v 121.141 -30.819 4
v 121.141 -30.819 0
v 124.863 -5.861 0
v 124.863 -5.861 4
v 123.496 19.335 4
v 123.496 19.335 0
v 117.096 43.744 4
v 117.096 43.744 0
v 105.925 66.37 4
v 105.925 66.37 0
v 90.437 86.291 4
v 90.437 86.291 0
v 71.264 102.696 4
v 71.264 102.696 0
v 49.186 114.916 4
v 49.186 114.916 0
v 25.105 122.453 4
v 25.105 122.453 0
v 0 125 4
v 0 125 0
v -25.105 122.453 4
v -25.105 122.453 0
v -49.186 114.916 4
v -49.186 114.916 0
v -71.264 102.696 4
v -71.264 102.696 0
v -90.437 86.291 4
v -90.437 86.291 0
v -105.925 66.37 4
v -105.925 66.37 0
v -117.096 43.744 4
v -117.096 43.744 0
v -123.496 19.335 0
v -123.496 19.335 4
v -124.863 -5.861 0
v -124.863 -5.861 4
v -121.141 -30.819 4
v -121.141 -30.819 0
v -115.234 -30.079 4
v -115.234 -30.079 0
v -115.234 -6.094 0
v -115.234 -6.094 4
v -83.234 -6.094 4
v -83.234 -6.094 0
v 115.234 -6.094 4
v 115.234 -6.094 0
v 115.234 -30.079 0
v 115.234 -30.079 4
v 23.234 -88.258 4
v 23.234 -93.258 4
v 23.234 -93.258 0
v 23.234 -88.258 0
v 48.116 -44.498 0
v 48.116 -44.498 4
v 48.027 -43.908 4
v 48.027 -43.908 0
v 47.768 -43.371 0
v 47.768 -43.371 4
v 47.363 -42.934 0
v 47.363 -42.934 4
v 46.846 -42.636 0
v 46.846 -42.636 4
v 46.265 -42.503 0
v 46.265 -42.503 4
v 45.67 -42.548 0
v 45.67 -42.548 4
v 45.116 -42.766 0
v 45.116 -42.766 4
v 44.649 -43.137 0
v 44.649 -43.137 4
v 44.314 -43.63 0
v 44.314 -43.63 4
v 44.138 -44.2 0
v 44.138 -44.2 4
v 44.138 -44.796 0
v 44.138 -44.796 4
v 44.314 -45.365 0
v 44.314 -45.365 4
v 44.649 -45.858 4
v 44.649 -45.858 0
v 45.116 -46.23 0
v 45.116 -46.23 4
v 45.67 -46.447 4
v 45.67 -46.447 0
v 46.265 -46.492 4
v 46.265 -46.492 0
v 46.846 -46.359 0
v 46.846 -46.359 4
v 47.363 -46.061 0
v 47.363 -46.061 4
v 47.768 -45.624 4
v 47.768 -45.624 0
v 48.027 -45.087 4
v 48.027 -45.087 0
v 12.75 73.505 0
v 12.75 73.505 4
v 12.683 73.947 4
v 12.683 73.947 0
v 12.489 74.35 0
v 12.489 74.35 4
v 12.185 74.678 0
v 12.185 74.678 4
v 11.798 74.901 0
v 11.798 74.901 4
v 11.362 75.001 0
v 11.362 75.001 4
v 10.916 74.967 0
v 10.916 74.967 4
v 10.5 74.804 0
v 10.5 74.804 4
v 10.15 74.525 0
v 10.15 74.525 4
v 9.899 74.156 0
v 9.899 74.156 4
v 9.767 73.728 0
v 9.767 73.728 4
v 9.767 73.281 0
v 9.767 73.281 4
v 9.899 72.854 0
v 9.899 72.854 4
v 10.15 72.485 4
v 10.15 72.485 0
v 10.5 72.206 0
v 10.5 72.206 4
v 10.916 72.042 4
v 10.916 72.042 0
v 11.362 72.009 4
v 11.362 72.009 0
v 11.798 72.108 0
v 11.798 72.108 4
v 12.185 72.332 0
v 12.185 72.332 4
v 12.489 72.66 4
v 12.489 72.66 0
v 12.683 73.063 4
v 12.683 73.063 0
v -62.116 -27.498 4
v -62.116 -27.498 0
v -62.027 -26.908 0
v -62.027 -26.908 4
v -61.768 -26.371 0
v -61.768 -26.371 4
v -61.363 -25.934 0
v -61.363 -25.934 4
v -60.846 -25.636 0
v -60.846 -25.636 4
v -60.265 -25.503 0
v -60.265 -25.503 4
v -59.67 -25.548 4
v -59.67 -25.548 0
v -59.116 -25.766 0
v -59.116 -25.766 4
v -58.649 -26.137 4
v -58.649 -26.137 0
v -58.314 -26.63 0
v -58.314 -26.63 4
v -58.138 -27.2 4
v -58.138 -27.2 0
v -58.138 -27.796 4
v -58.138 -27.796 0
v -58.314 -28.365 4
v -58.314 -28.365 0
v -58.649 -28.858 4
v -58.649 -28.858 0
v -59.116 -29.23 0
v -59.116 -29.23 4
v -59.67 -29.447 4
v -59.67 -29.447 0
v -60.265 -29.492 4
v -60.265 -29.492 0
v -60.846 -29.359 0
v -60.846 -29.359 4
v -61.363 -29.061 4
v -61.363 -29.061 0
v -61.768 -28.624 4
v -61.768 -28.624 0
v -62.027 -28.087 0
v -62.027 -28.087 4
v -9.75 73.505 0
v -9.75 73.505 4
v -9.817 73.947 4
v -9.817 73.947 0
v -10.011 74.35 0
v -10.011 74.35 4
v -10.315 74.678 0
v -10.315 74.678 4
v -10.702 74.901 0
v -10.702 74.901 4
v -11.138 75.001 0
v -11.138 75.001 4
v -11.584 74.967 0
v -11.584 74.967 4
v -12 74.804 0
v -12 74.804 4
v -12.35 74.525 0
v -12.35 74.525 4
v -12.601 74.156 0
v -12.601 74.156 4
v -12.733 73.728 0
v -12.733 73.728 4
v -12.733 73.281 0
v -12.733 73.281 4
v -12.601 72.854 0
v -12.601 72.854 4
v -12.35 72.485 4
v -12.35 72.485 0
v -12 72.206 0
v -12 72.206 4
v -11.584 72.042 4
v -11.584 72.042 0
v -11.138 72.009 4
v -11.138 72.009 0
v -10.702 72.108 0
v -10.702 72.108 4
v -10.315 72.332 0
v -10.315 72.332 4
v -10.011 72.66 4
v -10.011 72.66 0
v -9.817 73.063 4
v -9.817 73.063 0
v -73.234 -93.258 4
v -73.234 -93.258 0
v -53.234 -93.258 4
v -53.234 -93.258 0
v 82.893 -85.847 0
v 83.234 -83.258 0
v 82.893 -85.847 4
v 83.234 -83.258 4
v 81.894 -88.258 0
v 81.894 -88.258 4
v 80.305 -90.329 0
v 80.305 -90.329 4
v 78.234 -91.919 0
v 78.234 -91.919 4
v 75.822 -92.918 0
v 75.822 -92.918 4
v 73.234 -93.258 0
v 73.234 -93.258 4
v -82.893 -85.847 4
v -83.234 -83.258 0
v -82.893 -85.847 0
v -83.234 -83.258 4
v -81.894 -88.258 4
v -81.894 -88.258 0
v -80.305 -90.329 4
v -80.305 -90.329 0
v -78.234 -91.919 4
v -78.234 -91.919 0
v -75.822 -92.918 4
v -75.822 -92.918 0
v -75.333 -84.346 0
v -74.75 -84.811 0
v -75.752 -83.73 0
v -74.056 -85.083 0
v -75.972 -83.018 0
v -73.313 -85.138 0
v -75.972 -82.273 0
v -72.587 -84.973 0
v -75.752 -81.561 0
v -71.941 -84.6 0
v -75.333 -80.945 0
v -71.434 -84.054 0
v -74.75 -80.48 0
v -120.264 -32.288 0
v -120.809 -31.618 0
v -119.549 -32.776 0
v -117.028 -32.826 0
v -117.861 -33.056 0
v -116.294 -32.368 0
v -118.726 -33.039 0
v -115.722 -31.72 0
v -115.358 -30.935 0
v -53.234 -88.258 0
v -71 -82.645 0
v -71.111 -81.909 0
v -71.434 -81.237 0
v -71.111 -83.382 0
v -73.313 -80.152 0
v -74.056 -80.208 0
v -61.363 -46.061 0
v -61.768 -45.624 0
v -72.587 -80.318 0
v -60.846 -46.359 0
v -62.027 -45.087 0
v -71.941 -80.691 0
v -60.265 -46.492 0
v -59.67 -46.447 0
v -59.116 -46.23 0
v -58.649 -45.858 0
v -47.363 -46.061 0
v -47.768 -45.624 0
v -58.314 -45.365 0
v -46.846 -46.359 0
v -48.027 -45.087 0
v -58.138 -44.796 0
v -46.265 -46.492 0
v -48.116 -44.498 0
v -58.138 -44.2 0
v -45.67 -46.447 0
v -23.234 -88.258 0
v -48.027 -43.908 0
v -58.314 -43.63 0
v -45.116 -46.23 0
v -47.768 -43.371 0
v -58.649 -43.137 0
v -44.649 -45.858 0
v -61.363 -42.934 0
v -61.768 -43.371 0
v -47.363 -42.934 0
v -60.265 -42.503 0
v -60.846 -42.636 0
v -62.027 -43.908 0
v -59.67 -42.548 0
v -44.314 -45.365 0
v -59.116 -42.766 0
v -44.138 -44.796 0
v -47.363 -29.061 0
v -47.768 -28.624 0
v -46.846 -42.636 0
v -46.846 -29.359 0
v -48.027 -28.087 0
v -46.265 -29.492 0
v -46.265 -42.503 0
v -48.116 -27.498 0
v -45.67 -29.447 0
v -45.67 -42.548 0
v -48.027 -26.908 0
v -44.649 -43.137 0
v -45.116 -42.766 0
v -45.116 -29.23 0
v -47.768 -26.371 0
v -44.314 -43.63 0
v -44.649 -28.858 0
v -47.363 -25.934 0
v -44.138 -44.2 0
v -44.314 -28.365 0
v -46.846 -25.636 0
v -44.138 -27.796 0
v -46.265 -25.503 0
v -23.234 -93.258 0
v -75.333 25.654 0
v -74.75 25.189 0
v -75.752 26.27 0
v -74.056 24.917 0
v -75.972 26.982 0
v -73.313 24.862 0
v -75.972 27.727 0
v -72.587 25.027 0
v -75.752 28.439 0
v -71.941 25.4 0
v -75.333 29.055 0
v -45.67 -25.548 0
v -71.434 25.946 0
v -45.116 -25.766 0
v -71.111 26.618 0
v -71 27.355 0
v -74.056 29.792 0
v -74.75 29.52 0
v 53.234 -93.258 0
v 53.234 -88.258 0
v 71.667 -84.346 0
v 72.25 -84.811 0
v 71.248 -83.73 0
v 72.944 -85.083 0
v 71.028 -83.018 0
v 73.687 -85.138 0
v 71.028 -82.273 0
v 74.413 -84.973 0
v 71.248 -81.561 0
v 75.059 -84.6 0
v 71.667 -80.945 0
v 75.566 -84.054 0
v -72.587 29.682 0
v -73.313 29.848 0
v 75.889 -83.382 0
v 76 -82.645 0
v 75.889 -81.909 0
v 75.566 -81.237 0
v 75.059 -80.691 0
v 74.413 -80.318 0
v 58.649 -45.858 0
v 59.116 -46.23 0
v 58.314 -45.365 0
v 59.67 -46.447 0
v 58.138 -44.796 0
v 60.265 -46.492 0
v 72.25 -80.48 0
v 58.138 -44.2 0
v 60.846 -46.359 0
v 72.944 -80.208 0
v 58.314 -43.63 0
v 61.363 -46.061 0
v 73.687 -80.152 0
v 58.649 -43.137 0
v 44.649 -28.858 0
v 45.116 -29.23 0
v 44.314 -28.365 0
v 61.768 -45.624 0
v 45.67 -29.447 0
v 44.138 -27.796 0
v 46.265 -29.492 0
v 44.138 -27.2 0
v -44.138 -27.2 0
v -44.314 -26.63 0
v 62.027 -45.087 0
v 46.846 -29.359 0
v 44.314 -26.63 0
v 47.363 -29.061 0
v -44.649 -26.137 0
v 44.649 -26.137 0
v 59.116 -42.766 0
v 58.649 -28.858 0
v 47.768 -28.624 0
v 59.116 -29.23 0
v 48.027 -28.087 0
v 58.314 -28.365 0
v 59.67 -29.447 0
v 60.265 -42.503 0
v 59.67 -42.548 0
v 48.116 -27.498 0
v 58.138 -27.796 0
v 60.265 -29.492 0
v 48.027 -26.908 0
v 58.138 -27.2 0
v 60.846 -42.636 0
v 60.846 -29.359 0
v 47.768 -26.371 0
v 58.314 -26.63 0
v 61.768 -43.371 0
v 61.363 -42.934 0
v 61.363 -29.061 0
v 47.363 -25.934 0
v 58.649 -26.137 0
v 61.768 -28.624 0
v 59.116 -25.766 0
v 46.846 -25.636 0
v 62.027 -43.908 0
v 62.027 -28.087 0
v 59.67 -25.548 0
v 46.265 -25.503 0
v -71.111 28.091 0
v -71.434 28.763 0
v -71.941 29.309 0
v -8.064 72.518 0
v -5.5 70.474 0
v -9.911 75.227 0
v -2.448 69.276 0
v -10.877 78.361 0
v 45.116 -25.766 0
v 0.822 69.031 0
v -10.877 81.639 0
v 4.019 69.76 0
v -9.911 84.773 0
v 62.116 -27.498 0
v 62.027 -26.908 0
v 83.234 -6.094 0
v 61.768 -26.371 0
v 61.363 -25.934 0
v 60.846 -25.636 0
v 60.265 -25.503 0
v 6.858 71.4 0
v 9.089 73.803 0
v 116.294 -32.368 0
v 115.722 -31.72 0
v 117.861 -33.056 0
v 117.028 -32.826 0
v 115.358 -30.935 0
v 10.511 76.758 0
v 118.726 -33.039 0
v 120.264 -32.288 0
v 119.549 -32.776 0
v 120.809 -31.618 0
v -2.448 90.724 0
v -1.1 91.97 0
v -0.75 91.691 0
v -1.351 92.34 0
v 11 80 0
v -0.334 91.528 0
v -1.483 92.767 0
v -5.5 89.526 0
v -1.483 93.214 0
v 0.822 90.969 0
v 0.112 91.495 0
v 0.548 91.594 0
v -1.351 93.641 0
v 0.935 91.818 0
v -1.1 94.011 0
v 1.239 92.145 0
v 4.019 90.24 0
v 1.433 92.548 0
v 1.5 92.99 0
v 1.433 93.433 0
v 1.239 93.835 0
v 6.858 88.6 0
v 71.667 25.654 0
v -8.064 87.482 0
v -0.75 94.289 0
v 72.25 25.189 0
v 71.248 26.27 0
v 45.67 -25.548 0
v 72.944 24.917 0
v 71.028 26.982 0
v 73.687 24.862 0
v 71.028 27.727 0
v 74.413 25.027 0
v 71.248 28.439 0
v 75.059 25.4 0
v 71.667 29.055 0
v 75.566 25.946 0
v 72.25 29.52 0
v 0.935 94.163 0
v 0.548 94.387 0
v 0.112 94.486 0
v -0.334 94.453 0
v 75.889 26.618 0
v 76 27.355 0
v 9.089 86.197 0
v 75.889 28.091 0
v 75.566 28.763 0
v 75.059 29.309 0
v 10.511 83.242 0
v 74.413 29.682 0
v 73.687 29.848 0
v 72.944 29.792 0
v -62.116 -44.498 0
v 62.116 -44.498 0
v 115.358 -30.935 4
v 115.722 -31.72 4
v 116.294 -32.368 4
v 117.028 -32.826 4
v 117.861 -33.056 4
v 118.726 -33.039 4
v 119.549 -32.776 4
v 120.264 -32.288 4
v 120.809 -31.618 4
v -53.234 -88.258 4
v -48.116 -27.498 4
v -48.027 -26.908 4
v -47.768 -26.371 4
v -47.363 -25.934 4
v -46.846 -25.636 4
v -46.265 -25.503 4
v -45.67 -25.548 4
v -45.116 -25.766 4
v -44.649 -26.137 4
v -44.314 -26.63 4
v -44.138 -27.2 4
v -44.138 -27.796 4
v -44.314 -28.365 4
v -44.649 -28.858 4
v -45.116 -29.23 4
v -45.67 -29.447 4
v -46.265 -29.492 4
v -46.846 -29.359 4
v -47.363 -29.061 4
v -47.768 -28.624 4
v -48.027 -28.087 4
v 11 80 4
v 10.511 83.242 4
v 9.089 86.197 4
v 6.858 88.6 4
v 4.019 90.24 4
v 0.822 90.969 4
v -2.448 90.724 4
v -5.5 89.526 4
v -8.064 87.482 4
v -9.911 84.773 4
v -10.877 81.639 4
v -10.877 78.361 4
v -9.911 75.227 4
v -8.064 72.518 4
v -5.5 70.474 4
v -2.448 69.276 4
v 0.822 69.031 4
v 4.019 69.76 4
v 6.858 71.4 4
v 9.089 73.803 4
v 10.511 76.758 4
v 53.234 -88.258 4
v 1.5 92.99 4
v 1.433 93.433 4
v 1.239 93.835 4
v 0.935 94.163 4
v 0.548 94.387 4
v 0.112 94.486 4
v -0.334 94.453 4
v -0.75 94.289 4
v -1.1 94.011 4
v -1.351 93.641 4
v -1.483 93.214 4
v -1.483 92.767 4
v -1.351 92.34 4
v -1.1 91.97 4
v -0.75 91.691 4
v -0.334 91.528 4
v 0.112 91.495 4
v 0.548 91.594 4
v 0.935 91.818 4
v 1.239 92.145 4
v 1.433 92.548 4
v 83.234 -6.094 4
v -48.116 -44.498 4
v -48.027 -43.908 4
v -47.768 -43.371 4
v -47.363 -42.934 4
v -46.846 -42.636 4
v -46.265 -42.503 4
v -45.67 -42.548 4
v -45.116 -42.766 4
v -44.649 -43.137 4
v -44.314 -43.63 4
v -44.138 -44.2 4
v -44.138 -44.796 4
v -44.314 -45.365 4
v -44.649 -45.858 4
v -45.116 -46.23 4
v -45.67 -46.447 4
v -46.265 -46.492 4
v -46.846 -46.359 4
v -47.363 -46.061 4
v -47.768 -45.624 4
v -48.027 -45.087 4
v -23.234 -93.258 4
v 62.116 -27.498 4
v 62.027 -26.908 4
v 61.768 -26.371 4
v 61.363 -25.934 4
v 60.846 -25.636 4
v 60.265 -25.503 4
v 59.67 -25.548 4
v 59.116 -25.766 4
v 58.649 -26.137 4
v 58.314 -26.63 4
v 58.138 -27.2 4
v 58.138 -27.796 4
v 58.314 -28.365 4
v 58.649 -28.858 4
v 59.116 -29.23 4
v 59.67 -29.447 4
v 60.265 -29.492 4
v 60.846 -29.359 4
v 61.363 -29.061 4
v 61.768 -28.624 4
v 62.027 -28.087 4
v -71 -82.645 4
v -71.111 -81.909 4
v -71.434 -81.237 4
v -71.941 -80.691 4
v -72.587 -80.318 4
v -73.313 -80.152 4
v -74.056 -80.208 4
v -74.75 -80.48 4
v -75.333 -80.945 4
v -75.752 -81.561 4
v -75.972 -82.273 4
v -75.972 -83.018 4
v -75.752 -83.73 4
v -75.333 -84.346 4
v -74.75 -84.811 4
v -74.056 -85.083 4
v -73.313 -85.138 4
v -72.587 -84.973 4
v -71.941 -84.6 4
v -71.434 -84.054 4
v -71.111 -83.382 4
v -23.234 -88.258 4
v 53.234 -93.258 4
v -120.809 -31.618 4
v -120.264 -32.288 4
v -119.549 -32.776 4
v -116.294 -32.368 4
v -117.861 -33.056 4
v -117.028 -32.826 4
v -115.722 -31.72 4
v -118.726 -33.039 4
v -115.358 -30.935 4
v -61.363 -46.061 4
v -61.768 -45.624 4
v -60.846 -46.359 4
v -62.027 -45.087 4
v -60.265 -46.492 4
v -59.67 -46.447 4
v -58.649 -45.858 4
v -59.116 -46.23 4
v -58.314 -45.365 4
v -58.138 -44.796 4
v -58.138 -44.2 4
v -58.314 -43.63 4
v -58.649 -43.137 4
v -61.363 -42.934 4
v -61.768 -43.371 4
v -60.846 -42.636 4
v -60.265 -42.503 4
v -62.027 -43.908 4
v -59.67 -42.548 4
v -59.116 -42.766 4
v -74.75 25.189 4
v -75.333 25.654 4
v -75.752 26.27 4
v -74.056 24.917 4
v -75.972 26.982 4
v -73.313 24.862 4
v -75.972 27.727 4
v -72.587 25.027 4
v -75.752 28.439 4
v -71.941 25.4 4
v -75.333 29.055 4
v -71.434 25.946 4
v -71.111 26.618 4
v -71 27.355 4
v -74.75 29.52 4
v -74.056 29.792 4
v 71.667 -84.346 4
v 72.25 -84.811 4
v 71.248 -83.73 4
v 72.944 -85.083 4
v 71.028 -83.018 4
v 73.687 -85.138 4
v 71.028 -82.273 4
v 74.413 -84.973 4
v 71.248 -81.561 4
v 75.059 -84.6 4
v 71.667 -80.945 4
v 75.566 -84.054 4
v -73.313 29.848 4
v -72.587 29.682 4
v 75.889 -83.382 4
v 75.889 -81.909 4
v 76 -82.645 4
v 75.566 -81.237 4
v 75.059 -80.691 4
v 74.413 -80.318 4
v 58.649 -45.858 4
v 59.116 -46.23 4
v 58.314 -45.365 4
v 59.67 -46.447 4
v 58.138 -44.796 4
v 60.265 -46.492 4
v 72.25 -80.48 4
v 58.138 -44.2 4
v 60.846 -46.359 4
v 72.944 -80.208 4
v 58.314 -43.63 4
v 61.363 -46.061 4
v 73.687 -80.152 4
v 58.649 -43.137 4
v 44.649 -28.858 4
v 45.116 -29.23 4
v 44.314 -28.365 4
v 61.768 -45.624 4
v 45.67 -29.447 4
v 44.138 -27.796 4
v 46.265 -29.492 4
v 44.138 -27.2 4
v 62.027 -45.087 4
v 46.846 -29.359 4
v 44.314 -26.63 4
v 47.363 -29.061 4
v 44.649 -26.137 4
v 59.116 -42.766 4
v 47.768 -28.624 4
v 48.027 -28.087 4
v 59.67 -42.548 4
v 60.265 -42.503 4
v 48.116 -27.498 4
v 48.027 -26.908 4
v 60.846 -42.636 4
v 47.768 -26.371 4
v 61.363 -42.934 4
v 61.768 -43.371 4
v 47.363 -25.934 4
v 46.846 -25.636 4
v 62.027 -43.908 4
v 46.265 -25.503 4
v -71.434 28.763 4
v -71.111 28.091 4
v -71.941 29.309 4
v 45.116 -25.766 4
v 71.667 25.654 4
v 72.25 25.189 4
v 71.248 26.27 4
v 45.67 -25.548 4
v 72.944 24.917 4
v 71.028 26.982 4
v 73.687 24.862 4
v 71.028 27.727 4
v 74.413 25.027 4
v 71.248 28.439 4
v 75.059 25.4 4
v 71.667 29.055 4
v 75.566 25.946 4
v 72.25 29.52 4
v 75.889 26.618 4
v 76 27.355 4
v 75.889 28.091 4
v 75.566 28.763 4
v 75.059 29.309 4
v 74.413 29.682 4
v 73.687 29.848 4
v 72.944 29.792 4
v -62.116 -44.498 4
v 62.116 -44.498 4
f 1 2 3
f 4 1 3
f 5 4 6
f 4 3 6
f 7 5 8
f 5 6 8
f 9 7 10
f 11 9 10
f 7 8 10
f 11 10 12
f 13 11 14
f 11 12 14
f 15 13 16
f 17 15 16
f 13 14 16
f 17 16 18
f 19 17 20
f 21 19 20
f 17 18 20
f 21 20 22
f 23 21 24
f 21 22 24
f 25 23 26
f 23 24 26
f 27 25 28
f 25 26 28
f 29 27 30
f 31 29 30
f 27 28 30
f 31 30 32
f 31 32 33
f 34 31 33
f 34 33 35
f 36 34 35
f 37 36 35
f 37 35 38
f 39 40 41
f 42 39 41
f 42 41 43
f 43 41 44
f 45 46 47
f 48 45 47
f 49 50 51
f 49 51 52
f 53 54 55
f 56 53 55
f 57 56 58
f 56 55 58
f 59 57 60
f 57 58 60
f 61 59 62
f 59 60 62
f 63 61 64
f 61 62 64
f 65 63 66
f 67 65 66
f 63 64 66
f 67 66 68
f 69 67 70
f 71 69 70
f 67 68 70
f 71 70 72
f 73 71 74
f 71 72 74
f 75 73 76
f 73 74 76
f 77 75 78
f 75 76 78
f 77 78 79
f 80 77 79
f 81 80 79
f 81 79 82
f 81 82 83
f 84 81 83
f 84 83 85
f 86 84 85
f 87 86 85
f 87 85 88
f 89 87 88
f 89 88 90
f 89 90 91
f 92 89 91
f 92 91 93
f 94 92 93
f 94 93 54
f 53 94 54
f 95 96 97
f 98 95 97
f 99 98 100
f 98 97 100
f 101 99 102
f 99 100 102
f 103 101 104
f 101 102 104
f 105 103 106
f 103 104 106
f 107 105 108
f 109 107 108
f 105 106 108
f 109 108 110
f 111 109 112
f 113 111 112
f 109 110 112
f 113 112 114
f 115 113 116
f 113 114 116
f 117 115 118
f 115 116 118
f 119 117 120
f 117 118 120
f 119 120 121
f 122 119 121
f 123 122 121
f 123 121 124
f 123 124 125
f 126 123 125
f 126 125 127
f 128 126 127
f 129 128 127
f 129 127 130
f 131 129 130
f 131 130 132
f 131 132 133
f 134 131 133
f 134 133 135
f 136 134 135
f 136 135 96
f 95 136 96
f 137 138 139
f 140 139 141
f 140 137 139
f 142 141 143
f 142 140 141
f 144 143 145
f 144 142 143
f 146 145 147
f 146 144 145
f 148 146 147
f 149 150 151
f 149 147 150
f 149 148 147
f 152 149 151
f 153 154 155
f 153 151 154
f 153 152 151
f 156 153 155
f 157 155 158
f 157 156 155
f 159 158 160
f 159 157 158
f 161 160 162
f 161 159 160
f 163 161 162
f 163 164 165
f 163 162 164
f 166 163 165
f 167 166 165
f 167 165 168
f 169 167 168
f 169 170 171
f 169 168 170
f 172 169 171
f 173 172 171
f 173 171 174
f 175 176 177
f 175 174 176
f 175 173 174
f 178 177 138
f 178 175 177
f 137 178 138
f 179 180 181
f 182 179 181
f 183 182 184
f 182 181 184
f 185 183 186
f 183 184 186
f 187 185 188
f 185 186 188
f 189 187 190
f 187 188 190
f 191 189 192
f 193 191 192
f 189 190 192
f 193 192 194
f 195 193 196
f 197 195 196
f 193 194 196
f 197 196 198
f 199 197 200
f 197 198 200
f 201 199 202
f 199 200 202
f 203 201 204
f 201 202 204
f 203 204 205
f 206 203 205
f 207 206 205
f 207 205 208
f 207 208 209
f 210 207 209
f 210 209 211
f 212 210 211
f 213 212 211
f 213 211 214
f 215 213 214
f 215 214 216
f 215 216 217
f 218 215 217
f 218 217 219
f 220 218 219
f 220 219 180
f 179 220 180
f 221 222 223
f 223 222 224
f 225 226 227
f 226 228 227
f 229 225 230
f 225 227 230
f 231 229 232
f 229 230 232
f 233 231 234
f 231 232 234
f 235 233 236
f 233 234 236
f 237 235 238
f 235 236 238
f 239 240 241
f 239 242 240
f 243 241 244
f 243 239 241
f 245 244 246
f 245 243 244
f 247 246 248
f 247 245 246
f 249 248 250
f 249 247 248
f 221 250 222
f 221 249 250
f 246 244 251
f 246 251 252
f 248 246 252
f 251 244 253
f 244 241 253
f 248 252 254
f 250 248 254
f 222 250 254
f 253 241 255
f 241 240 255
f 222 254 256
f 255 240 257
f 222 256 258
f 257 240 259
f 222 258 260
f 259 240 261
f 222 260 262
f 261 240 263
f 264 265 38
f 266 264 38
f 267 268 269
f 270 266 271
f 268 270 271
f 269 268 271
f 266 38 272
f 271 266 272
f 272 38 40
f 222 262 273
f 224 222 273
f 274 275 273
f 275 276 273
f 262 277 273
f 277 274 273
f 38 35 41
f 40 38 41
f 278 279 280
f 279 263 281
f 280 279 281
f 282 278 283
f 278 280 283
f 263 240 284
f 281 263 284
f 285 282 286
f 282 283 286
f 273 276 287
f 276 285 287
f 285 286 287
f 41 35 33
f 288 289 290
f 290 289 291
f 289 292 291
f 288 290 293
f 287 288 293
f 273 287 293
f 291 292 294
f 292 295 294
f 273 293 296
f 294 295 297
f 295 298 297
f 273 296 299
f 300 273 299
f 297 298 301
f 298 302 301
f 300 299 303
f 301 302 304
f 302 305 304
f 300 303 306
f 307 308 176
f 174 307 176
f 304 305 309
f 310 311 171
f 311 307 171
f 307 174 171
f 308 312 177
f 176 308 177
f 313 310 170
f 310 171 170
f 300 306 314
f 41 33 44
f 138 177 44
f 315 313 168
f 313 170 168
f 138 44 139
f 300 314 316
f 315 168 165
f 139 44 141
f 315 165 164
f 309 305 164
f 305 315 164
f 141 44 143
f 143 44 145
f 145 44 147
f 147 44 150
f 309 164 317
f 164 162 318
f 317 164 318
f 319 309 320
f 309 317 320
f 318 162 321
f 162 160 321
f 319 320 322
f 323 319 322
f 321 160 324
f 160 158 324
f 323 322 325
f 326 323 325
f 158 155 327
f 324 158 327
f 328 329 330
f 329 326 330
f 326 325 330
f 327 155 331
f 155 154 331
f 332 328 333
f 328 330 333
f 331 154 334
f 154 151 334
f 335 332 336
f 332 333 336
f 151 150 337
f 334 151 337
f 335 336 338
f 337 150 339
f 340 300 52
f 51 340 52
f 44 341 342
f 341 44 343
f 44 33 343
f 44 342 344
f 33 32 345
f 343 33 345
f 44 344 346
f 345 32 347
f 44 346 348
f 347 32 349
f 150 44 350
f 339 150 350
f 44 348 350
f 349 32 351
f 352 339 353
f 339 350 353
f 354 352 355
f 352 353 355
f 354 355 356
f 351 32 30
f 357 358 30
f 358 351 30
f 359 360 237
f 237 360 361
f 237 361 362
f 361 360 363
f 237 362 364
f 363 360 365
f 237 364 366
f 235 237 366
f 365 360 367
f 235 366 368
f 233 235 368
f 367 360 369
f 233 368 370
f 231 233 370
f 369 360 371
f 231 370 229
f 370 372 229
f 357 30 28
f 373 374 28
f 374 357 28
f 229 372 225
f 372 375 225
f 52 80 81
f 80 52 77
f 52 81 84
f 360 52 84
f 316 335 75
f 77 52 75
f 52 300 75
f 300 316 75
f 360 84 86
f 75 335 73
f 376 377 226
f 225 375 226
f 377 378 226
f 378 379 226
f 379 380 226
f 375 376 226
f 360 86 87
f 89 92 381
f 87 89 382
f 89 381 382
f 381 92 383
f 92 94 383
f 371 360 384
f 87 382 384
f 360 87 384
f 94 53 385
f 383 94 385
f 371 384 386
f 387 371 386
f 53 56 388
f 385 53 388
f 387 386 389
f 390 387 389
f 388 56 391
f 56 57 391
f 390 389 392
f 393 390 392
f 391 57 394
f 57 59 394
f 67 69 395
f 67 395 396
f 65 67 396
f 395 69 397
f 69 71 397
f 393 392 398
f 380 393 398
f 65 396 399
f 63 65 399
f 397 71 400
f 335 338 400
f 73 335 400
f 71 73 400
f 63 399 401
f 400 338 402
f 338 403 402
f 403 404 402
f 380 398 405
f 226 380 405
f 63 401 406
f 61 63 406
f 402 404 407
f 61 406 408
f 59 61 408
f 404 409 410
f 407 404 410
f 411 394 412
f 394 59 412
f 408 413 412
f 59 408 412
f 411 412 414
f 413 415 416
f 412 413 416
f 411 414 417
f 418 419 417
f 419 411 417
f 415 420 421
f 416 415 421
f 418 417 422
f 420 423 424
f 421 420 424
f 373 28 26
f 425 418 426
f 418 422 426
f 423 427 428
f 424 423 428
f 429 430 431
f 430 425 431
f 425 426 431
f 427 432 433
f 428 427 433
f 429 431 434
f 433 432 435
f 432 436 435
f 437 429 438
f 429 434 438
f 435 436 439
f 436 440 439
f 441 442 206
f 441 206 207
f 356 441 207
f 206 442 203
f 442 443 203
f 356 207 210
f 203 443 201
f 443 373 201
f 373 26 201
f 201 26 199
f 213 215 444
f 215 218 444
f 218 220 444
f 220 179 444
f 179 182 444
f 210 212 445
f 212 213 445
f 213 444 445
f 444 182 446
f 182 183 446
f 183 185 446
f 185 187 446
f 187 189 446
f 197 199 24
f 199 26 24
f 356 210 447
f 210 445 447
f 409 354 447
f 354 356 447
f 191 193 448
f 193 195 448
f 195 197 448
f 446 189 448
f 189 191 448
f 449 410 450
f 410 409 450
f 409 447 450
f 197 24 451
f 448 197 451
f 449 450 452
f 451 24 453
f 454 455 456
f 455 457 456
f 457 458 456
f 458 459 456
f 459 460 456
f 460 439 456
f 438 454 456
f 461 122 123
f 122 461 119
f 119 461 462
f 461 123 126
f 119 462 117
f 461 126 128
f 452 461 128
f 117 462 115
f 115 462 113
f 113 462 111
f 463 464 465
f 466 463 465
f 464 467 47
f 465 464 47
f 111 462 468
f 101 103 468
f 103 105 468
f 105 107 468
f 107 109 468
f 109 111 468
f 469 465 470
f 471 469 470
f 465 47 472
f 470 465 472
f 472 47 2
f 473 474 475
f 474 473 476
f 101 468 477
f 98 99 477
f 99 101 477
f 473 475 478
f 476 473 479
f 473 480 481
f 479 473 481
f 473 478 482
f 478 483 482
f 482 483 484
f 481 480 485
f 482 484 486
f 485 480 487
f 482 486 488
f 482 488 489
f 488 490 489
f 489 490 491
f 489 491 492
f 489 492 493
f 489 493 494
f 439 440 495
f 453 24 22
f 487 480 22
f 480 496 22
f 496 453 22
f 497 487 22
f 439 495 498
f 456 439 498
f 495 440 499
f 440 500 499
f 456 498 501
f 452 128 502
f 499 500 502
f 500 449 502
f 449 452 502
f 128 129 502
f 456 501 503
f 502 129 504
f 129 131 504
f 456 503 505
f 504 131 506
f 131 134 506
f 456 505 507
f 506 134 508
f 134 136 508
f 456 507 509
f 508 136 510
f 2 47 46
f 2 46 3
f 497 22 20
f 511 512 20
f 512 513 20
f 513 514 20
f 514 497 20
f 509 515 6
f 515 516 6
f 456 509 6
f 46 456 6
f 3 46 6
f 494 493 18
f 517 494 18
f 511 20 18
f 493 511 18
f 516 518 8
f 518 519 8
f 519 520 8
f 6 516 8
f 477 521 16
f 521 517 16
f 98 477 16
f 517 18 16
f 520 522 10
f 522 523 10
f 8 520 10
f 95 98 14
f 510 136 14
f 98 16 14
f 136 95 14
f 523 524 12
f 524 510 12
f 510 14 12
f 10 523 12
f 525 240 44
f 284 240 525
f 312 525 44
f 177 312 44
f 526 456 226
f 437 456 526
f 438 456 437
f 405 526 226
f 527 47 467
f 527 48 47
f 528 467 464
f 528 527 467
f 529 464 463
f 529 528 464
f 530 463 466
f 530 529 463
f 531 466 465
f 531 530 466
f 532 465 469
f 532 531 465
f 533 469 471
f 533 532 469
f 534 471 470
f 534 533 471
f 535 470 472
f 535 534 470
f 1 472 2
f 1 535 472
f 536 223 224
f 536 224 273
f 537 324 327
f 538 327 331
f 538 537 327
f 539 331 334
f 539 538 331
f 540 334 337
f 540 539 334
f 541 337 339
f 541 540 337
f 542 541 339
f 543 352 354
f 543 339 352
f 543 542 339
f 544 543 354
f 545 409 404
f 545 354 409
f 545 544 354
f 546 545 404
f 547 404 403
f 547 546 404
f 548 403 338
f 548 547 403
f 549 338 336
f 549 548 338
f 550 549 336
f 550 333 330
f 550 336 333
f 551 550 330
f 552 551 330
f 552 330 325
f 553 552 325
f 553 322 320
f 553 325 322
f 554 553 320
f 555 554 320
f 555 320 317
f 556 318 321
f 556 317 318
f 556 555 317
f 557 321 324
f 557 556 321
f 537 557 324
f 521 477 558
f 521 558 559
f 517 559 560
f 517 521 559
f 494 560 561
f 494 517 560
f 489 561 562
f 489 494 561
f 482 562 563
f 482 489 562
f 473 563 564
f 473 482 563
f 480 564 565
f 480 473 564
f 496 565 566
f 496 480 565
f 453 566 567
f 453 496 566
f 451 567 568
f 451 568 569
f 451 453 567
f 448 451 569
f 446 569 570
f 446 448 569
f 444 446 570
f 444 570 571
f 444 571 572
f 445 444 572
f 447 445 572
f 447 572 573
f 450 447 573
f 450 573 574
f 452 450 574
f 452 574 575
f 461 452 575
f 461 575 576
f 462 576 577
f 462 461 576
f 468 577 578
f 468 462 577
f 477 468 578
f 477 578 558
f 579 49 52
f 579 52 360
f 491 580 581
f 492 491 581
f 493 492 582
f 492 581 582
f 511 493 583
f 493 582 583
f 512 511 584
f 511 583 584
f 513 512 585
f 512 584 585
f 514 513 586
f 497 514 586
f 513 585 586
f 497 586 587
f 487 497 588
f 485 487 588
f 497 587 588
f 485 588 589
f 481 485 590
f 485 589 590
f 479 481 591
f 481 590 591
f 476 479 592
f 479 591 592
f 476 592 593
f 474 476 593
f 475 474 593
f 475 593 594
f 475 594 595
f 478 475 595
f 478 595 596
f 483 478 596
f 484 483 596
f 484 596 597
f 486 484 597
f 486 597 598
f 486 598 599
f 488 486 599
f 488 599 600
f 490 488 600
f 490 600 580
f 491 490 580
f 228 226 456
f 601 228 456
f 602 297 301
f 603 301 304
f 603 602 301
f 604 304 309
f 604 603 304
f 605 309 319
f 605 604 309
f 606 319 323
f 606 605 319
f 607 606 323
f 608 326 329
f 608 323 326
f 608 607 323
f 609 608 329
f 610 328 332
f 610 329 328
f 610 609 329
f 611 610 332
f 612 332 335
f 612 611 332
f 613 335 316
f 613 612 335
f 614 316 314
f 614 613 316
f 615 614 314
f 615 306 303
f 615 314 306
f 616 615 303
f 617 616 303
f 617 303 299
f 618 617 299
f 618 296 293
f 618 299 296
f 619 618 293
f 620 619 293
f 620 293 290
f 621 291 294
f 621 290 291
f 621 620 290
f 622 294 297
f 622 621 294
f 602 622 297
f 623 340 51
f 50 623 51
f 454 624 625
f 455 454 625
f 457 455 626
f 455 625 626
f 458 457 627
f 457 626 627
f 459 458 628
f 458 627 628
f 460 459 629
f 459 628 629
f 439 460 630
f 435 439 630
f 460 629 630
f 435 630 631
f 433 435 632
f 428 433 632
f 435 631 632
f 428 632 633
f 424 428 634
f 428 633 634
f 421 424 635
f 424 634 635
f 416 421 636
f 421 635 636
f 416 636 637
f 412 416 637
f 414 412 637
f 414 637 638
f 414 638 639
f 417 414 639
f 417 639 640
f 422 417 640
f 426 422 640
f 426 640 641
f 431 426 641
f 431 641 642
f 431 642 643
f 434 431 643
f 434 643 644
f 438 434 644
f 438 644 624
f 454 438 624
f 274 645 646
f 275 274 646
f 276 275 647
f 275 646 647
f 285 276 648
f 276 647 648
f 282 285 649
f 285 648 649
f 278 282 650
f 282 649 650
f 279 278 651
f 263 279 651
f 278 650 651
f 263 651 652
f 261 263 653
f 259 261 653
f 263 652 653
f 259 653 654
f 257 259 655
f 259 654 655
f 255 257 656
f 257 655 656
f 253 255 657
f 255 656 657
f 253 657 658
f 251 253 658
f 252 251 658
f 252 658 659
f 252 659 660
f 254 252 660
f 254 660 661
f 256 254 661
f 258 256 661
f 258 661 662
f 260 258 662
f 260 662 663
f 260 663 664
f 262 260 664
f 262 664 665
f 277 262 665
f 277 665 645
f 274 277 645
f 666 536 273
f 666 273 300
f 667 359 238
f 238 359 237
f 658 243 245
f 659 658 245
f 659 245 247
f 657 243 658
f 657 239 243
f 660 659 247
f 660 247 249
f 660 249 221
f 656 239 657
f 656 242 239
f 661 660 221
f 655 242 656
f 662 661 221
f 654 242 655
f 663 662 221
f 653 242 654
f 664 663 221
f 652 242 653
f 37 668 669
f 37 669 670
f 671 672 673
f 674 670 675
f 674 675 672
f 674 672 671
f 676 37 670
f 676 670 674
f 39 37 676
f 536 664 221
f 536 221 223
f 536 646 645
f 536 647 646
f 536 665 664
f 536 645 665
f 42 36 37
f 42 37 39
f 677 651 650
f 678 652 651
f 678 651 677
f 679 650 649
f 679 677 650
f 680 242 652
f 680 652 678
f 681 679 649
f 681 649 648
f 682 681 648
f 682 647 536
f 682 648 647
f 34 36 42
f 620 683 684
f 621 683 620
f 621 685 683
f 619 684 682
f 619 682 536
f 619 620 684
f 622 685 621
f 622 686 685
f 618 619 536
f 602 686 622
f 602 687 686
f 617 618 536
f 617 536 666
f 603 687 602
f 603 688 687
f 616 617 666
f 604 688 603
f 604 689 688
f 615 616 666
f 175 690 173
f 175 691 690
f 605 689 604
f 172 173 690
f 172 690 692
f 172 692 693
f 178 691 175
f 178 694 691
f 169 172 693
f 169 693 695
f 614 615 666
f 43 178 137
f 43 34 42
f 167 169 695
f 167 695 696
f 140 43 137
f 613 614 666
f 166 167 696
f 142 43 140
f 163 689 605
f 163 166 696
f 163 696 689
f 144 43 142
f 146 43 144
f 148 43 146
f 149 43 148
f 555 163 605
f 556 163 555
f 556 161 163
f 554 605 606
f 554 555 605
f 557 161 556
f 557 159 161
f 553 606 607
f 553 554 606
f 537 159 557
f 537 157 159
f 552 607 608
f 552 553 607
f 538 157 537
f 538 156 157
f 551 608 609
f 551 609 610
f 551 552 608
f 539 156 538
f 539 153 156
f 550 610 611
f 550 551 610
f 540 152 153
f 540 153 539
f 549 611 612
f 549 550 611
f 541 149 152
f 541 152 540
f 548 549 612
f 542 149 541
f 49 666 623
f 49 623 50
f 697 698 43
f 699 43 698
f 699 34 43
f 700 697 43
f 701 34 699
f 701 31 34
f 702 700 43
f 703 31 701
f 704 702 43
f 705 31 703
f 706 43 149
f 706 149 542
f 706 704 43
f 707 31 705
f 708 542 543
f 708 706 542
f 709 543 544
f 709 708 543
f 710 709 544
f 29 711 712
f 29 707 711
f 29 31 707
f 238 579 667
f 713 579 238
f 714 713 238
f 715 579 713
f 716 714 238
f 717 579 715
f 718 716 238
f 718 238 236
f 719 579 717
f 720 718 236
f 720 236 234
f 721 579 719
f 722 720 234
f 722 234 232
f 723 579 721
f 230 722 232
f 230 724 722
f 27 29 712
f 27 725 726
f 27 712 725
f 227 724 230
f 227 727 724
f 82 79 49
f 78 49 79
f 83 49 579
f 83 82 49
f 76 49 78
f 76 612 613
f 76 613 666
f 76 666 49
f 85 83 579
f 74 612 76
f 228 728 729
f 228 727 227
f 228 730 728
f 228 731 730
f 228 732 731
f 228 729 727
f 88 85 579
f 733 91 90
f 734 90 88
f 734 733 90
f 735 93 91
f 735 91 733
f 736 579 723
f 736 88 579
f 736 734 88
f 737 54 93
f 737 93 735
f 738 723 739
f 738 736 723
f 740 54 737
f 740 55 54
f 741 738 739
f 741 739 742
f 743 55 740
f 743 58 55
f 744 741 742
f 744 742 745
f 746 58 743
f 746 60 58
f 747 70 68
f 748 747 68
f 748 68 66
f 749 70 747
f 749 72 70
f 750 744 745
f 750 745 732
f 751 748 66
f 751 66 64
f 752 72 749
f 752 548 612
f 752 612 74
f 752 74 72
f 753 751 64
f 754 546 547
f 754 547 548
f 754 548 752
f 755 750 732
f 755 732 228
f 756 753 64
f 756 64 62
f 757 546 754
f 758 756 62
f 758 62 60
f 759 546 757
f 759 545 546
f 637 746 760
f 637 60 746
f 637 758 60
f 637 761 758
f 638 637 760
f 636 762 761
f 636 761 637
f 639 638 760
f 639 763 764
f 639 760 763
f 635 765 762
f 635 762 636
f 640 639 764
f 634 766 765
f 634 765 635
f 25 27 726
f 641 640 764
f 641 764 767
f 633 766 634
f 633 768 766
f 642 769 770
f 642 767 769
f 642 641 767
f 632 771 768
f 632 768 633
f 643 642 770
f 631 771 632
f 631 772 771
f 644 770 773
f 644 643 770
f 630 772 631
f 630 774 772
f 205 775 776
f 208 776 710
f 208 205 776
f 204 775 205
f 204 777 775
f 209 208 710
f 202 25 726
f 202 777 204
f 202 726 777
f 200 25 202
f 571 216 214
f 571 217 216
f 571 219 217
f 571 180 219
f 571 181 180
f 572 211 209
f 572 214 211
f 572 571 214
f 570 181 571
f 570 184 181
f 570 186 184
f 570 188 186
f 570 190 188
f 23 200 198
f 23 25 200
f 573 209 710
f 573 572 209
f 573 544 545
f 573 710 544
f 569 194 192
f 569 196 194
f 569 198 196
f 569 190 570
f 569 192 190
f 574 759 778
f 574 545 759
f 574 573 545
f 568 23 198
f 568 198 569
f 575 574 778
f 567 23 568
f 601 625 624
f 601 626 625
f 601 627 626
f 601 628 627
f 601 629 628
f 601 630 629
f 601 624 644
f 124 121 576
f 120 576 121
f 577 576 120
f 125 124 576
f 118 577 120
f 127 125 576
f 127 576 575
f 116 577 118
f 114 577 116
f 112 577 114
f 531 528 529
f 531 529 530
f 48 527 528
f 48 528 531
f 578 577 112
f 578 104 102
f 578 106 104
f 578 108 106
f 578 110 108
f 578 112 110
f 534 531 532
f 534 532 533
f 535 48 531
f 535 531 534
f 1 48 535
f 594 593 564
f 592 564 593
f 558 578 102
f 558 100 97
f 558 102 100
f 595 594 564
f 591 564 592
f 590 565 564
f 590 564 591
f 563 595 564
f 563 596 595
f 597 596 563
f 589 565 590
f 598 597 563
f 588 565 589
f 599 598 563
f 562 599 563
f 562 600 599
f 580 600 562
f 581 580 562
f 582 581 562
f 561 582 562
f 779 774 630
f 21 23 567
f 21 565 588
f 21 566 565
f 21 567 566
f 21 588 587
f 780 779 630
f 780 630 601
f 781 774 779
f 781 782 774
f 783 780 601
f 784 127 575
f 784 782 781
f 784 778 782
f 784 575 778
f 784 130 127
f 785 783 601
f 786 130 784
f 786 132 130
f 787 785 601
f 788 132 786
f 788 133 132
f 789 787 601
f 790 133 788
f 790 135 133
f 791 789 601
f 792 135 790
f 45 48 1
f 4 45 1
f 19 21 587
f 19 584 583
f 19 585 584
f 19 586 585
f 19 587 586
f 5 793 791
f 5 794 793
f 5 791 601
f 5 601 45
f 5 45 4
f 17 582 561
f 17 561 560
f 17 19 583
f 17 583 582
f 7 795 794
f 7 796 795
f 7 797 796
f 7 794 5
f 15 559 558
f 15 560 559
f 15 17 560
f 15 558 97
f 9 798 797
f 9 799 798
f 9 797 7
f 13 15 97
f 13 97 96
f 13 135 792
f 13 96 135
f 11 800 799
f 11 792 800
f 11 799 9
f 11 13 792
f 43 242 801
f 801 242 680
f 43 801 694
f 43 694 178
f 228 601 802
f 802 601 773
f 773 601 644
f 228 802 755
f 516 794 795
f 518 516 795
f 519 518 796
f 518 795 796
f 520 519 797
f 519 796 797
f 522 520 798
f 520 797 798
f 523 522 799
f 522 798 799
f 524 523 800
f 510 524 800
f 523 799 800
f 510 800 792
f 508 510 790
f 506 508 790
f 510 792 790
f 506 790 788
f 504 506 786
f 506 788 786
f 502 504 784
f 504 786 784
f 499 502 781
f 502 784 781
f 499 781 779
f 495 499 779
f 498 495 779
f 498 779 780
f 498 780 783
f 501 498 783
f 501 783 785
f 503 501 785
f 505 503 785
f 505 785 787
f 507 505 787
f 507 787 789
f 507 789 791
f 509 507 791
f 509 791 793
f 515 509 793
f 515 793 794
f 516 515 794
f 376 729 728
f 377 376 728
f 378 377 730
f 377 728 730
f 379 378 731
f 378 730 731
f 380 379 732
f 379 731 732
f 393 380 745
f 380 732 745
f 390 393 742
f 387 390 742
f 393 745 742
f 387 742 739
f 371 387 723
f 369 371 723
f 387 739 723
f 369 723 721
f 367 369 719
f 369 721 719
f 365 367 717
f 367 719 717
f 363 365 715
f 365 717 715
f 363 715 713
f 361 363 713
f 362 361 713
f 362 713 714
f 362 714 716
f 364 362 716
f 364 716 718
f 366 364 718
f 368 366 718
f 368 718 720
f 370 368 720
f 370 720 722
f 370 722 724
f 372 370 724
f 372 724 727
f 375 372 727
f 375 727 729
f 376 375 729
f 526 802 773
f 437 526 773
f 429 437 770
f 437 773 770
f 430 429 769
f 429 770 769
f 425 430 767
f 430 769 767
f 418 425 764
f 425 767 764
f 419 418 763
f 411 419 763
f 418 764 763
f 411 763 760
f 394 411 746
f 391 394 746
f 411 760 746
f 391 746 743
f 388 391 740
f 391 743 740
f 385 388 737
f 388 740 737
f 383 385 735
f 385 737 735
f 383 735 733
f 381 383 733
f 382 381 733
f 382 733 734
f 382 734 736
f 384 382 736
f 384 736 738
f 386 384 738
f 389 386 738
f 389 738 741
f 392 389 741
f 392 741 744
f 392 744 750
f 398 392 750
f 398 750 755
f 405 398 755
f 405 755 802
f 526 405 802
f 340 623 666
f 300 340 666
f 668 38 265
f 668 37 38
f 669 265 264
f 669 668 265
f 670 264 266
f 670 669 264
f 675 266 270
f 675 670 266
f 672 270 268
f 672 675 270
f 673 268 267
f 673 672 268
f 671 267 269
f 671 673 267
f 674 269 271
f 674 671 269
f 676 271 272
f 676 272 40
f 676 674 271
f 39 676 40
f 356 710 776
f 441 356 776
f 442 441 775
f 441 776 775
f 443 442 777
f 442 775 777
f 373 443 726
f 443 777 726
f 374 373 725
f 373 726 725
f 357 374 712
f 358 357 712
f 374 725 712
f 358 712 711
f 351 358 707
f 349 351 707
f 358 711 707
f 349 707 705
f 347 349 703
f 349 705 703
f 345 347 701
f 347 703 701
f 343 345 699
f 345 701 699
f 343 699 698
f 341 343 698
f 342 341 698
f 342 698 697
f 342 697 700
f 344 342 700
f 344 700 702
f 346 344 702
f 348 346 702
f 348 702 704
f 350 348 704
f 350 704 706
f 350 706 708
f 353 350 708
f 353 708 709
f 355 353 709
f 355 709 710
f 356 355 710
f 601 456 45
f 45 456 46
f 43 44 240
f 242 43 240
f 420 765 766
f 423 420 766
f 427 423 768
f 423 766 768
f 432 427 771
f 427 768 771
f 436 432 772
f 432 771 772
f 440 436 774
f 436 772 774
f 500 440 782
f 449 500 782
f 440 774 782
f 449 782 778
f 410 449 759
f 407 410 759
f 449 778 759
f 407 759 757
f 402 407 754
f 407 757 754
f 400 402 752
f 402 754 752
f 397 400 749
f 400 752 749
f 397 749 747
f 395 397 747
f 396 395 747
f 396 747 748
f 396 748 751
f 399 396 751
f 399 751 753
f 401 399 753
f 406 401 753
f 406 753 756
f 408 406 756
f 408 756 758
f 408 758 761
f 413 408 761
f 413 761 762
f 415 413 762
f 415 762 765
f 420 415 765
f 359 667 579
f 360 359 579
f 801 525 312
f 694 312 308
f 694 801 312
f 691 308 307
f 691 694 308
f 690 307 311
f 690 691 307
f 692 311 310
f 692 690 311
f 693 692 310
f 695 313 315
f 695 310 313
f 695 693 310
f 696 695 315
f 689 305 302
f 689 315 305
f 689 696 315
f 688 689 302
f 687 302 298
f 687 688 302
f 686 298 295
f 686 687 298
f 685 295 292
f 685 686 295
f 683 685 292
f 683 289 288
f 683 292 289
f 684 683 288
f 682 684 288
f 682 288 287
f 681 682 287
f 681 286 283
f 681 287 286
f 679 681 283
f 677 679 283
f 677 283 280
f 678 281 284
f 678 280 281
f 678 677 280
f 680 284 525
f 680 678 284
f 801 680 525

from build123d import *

# Parameters (mm, degrees)
SKETCH1_R           = 11
BOSS_EXTRUDE1_DEPTH = 4
SKETCH2_R           = 1.5
CUT_EXTRUDE1_DEPTH  = 10
CUT_EXTRUDE2_START  = -10
CUT_EXTRUDE2_DEPTH  = 10
FILLET1_R           = 10
FILLET3_R           = 3
SKETCH5_W           = 30
SKETCH5_H           = 5
CUT_EXTRUDE4_DEPTH  = 10
SKETCH6_R           = 2.5
CUT_EXTRUDE5_DEPTH  = 177.821944339
SKETCH8_R           = 2
CUT_EXTRUDE7_DEPTH  = 177.821944339


with BuildPart() as part:
    # Sketch1 → Boss-Extrude1 (new body)
    with BuildSketch(Plane.XY):
        with BuildLine():
            Line((-115.233797414, -48.437298991), (-115.233797414, -6.093952298))
            Line((-115.233797414, -6.093952298), (-83.233797414, -6.093952298))
            Line((-83.233797414, -6.093952298), (-83.233797414, -93.258431083))
            ThreePointArc((-83.233797414, -93.258431083), (0, -125), (83.233797414, -93.258431083))
            Line((83.233797414, -93.258431083), (83.233797414, -6.093952298))
            Line((83.233797414, -6.093952298), (115.233797414, -6.093952298))
            Line((115.233797414, -6.093952298), (115.233797414, -48.437298991))
            ThreePointArc((115.233797414, -48.437298991), (0, 125), (-115.233797414, -48.437298991))
        make_face()
        with Locations((0, 80)):
            Circle(SKETCH1_R, mode=Mode.SUBTRACT)
    extrude(amount=BOSS_EXTRUDE1_DEPTH)

    # Sketch2 → Cut-Extrude1 (cut)
    with BuildSketch(Plane.XY.offset(4)):
        with Locations((0, 92.990381057)):
            Circle(SKETCH2_R)
        with Locations((11.25, 73.504809472)):
            Circle(SKETCH2_R)
        with Locations((-11.25, 73.504809472)):
            Circle(SKETCH2_R)
    extrude(amount=-CUT_EXTRUDE1_DEPTH, mode=Mode.SUBTRACT)

    # Sketch3 → Cut-Extrude2 (cut)
    with BuildSketch(Plane.XY.offset(4).offset(CUT_EXTRUDE2_START)):
        with BuildLine():
            Line((-83.233797414, -93.258431083), (83.233797414, -93.258431083))
            ThreePointArc((83.233797414, -93.258431083), (0, -125), (-83.233797414, -93.258431083))
        make_face()
    extrude(amount=CUT_EXTRUDE2_DEPTH, mode=Mode.SUBTRACT)

    # Fillet1
    fillet1_edges = [part.edges().sort_by_distance(p)[0] for p in [
        (83.233797414, -93.258431083, 2),
        (-83.233797414, -93.258431083, 2),
    ]]
    fillet(fillet1_edges, radius=FILLET1_R)

    # Fillet3
    fillet3_edges = [part.edges().sort_by_distance(p)[0] for p in [
        (115.233797414, -48.437298991, 2),
        (-115.233797414, -48.437298991, 2),
    ]]
    fillet(fillet3_edges, radius=FILLET3_R)

    # Sketch5 → Cut-Extrude4 (cut)
    with BuildSketch(Plane.XY.offset(4)):
        with Locations((38.233797414, -90.758431083)):
            Rectangle(SKETCH5_W, SKETCH5_H)
        with Locations((-38.233797414, -90.758431083)):
            Rectangle(SKETCH5_W, SKETCH5_H)
    extrude(amount=-CUT_EXTRUDE4_DEPTH, mode=Mode.SUBTRACT)

    # Sketch6 → Cut-Extrude5 (cut, through all)
    with BuildSketch(Plane.XY.offset(4)):
        with Locations((-73.5, -82.645466924)):
            Circle(SKETCH6_R)
        with Locations((73.5, -82.645466924)):
            Circle(SKETCH6_R)
        with Locations((73.5, 27.354533076)):
            Circle(SKETCH6_R)
        with Locations((-73.5, 27.354533076)):
            Circle(SKETCH6_R)
    extrude(amount=-CUT_EXTRUDE5_DEPTH, mode=Mode.SUBTRACT)

    # Sketch8 → Cut-Extrude7 (cut, through all)
    with BuildSketch(Plane.XY.offset(4)):
        with Locations((46.115537646, -27.497588789)):
            Circle(SKETCH8_R)
        with Locations((46.115537646, -44.497588789)):
            Circle(SKETCH8_R)
        with Locations((60.115537646, -44.497588789)):
            Circle(SKETCH8_R)
        with Locations((60.115537646, -27.497588789)):
            Circle(SKETCH8_R)
    cut_extrude7 = extrude(amount=-CUT_EXTRUDE7_DEPTH, mode=Mode.SUBTRACT)

    # Mirror2: Cut-Extrude7 across plane
    add(cut_extrude7.mirror(Plane.ZY), mode=Mode.SUBTRACT)


solid = part.part
